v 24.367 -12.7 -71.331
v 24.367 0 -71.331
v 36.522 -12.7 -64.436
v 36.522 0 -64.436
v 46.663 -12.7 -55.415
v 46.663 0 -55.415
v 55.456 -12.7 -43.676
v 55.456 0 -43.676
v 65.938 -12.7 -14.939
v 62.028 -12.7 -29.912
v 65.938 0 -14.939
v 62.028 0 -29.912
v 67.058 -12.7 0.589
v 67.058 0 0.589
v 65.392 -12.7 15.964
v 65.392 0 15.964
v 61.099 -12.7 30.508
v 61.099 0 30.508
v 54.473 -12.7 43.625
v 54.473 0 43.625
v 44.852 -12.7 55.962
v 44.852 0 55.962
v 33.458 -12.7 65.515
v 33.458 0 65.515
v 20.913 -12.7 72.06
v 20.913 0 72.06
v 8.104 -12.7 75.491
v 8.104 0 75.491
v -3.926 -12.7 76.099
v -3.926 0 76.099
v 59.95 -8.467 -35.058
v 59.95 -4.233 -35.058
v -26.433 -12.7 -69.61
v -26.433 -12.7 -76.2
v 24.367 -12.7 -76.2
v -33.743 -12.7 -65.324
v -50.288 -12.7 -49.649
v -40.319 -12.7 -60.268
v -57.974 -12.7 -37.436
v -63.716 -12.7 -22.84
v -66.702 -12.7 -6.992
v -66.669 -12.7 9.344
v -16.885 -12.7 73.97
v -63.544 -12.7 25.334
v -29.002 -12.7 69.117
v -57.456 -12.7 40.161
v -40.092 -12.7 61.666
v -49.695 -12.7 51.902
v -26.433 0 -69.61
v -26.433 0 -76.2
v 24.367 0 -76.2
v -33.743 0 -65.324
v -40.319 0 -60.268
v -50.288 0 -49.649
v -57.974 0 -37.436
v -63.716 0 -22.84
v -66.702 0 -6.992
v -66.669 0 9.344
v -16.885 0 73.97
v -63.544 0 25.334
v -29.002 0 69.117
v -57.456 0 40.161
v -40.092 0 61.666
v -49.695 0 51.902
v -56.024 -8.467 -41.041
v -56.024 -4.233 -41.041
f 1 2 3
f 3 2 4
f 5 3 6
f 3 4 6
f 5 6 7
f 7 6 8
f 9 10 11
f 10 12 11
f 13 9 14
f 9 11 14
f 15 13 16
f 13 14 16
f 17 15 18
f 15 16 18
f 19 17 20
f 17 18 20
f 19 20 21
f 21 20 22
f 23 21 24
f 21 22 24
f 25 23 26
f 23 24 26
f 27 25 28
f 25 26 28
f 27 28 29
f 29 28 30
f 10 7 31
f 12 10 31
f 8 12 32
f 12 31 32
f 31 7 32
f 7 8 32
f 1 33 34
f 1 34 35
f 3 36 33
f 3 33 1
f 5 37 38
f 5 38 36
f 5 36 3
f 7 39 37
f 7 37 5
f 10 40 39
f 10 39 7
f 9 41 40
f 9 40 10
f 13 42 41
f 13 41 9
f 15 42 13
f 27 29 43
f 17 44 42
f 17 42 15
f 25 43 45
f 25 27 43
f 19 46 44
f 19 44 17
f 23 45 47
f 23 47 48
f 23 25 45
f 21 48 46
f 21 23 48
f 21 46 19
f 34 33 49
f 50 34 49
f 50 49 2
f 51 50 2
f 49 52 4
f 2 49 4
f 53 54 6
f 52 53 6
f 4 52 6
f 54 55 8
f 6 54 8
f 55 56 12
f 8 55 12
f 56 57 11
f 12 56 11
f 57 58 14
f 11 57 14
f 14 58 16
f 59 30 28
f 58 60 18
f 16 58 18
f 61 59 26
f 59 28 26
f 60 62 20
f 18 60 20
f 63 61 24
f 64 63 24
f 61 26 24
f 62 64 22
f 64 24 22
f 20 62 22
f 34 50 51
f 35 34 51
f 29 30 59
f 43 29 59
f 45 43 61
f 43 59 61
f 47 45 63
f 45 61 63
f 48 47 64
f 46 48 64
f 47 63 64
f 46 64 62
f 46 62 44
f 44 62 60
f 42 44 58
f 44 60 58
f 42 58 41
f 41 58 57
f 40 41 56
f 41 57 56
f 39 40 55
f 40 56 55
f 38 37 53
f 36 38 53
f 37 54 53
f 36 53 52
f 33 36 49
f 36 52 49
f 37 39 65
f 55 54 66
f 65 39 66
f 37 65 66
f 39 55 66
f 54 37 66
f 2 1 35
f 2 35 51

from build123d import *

# Parameters (mm, degrees)
F1_DEPTH = 12.7
F2_W     = 50.8
F2_H     = 12.7
F3_DEPTH = 76.2


with BuildPart() as f1:
    # F0 (on Front) → F1 (new body)
    with BuildSketch(Plane.XZ):
        with BuildLine():
            add(Edge.make_bspline(
                [(-3.925731, 76.098808), (-119.899562, 70.116034), (-56.024051, -41.040792), (7.851461, -152.197617), (59.949781, -35.058017), (112.048101, 82.081583), (-3.925731, 76.098808)],
                knots=[0, 0, 0, 2.094395, 2.094395, 4.18879, 4.18879, 6.283185, 6.283185, 6.283185], degree=2, weights=[1, 0.5, 1, 0.5, 1, 0.5, 1]))
        make_face()
    extrude(amount=F1_DEPTH)

    # F2 (on Top) → F3 (join)
    with BuildSketch(Plane.XY):
        with Locations((-1.032503, -6.35)):
            Rectangle(F2_W, F2_H)
    extrude(amount=-F3_DEPTH)


solid = f1.part
